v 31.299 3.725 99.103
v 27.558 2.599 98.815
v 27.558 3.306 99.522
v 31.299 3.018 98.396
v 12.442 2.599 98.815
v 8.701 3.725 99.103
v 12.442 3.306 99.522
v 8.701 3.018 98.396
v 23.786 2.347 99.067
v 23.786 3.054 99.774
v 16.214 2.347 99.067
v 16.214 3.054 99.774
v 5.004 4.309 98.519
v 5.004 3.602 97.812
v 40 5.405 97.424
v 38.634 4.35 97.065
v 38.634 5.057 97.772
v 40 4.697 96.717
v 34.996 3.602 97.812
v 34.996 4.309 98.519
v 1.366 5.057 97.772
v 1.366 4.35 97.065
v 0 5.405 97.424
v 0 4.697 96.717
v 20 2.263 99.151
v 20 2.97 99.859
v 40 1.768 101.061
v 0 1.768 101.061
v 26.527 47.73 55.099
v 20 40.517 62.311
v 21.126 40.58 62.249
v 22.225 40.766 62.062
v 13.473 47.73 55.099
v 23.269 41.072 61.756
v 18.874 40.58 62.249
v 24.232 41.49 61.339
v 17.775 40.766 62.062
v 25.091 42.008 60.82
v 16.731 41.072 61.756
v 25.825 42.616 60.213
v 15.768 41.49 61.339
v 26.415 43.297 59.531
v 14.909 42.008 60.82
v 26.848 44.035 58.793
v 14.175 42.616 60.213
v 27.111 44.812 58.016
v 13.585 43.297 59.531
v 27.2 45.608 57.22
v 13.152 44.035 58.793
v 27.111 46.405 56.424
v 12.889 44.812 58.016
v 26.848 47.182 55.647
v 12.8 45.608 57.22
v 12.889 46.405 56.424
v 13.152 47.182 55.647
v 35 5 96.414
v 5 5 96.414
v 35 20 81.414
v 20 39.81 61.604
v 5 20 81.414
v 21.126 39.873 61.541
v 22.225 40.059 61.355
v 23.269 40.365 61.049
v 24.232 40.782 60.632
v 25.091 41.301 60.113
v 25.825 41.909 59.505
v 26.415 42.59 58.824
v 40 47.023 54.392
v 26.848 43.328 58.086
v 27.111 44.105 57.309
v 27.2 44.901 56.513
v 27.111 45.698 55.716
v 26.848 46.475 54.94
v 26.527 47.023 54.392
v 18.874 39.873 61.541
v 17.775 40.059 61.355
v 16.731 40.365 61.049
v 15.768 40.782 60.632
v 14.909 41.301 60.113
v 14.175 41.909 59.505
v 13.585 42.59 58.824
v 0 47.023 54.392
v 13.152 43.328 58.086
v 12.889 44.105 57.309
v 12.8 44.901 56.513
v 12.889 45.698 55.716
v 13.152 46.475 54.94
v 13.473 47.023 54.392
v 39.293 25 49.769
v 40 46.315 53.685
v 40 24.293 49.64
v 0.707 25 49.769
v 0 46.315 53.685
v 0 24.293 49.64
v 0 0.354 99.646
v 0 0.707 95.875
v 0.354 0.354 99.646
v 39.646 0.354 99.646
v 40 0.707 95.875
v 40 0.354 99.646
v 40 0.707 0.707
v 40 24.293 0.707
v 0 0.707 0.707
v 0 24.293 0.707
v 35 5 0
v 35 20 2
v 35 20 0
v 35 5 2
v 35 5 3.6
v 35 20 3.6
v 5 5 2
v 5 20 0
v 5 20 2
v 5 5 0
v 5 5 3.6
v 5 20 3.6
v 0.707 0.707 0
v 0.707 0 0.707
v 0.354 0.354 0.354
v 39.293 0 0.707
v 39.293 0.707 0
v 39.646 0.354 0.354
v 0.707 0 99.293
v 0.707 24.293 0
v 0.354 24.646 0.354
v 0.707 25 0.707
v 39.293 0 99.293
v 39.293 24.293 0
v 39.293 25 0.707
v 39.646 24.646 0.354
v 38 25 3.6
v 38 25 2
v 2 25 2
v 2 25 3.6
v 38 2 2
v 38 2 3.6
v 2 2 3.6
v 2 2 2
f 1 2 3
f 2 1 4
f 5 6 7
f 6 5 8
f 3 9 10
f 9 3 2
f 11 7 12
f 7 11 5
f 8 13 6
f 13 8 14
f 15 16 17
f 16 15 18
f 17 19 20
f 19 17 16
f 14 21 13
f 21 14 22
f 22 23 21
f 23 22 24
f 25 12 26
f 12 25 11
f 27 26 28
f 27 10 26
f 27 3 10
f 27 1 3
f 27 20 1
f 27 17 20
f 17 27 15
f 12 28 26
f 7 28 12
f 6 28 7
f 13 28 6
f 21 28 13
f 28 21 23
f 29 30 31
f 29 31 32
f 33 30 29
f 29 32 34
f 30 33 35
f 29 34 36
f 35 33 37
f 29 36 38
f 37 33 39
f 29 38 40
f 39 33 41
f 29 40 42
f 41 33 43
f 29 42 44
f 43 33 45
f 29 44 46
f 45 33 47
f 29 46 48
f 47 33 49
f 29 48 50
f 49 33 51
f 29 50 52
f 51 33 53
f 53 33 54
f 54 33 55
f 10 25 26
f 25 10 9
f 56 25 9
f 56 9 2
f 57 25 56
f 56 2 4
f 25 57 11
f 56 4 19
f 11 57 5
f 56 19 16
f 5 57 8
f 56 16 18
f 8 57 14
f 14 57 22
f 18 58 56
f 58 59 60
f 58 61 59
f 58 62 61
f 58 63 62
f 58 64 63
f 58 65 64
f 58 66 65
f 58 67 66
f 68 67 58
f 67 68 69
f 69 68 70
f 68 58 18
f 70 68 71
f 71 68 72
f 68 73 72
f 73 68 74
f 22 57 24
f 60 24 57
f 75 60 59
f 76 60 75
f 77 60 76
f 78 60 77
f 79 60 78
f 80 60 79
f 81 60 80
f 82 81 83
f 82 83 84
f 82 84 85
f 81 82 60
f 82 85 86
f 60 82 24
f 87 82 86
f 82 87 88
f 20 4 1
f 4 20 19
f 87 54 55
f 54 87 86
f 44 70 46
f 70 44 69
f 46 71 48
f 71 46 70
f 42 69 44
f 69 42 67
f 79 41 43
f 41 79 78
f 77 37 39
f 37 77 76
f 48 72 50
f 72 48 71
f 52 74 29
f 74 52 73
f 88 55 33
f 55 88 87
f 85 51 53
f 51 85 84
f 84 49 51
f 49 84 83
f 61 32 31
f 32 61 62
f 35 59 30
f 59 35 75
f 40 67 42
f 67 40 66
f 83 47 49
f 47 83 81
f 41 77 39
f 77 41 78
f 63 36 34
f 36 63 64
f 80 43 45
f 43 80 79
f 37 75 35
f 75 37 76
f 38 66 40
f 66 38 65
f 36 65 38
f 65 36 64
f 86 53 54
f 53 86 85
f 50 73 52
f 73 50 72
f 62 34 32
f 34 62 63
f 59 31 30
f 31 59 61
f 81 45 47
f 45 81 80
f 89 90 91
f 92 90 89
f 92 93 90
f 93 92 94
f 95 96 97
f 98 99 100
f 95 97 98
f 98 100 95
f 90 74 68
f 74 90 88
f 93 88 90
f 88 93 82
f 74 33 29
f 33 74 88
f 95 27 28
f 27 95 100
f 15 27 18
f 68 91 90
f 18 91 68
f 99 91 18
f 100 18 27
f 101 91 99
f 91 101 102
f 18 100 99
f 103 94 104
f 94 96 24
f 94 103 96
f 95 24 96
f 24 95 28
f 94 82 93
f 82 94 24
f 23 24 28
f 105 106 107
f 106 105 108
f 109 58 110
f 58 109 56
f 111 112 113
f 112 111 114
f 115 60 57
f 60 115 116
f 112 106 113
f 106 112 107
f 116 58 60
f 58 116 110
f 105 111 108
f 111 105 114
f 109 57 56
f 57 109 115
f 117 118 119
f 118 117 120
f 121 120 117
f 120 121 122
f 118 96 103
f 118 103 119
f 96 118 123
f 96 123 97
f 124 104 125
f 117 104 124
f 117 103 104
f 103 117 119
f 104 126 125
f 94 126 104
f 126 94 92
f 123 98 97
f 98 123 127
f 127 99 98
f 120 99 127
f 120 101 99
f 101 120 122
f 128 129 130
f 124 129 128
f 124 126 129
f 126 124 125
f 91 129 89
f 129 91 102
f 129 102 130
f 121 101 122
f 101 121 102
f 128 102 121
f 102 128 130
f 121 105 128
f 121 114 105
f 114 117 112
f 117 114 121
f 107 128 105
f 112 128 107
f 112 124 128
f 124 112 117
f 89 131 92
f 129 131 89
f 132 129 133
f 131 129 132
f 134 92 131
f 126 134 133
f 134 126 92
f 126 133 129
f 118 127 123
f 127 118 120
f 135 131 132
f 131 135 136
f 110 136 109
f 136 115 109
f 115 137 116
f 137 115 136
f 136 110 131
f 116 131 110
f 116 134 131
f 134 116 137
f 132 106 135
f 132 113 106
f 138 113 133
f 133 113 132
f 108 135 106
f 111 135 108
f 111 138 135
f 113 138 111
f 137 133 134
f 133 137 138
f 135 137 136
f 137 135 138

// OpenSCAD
// file: chamfer.scad
module chamfered_cube(size, chamfer, center = false) {
    center_offset = center ? [
        -size[0]/2,
        -size[1]/2,
        -size[2]/2
    ] : [0,0,0];
    
    translate(center_offset)
    
    difference() {
        cube(size);
        
        chamfer_cross(size, chamfer);
        
        translate([0,size[1],size[2]])
        chamfer_cross(size, chamfer);
        
        translate([size[0],0,size[2]])
        chamfer_cross(size, chamfer);
        
        translate([size[0],size[1], 0])
        chamfer_cross(size, chamfer);
    }
}

module chamfer_cross(size, chamfer){
    for(z=[0:3]) for(y=[0:3])
            rotate([0,90*y,90*z])
            translate([max(size)/2,0,0])
            rotate([45,0,0])
            cube([max(size),chamfer,chamfer], true);
}

chamfered_cube([10,20,30], 2, true);
// main file
use <chamfer.scad>;


//for(i=[1: 5])
//    translate([i*35,0,0])
//slit(i*0.1);

diffraction_angle = 90-45;
tall = 100;
wall = 5;
width = 30;
height = 15;

//slit_side();

//grating_holder();
spec();

module dvd() {
    difference() {
        cylinder(1, 120/2+0.3, 120/2+0.3, $fn=100);
        cylinder(2, 15/2-0.3, 15/2-0.3, $fn=40);
        
    }
}

module grating_holder() {
    
    difference(){
        
        hull(){
        translate([-width/2-wall,0,-1])
        cube([width+wall*2, 65, 2]);
            
            translate([-width/2-wall,20,-30])
        cube([width+wall*2, 10, 10]);
        }
        
        translate([0,3,0])
        #dvd();
    }
}


module slit_side(offset=0){
    difference(){
    
        translate([-15,-15,0])
        cube([30, 30, 1]);
        
        translate([-10,-offset,0])
        rotate([45,0,0]) 
        cube([20, 20, 20]);
        
        translate([-10,-offset,-1])
        cube([20, 20, 20]);
        
        
    }
}

module slit(offset=0){
    slit_side(offset/2);
    mirror([0,1,0]) slit_side(offset/2);
    
}

module spec(){
    difference(){
            translate([0,0,tall])
            rotate([-diffraction_angle,0,0])
            translate([width/2+wall,65+0.5,1])
            mirror([0,1,0])
            grating_holder();
        
        #translate([wall, wall, -1])
        cube([width, height, tall+10]);
        
    }


    difference(){
        
        chamfered_cube([width+wall*2, height+wall*2, tall], 1);

        
        #translate([wall, wall, -1])
        cube([width, height, tall+10]);
        
        translate([0,0,tall])
        rotate([-diffraction_angle,0,0])
        cube([100, 100, 100]);
        
        
        
        #translate([wall/2-0.5, wall/2-0.5, 2])
        cube([width+wall+1, 60+1, 1+0.6]);
        
    }
}
